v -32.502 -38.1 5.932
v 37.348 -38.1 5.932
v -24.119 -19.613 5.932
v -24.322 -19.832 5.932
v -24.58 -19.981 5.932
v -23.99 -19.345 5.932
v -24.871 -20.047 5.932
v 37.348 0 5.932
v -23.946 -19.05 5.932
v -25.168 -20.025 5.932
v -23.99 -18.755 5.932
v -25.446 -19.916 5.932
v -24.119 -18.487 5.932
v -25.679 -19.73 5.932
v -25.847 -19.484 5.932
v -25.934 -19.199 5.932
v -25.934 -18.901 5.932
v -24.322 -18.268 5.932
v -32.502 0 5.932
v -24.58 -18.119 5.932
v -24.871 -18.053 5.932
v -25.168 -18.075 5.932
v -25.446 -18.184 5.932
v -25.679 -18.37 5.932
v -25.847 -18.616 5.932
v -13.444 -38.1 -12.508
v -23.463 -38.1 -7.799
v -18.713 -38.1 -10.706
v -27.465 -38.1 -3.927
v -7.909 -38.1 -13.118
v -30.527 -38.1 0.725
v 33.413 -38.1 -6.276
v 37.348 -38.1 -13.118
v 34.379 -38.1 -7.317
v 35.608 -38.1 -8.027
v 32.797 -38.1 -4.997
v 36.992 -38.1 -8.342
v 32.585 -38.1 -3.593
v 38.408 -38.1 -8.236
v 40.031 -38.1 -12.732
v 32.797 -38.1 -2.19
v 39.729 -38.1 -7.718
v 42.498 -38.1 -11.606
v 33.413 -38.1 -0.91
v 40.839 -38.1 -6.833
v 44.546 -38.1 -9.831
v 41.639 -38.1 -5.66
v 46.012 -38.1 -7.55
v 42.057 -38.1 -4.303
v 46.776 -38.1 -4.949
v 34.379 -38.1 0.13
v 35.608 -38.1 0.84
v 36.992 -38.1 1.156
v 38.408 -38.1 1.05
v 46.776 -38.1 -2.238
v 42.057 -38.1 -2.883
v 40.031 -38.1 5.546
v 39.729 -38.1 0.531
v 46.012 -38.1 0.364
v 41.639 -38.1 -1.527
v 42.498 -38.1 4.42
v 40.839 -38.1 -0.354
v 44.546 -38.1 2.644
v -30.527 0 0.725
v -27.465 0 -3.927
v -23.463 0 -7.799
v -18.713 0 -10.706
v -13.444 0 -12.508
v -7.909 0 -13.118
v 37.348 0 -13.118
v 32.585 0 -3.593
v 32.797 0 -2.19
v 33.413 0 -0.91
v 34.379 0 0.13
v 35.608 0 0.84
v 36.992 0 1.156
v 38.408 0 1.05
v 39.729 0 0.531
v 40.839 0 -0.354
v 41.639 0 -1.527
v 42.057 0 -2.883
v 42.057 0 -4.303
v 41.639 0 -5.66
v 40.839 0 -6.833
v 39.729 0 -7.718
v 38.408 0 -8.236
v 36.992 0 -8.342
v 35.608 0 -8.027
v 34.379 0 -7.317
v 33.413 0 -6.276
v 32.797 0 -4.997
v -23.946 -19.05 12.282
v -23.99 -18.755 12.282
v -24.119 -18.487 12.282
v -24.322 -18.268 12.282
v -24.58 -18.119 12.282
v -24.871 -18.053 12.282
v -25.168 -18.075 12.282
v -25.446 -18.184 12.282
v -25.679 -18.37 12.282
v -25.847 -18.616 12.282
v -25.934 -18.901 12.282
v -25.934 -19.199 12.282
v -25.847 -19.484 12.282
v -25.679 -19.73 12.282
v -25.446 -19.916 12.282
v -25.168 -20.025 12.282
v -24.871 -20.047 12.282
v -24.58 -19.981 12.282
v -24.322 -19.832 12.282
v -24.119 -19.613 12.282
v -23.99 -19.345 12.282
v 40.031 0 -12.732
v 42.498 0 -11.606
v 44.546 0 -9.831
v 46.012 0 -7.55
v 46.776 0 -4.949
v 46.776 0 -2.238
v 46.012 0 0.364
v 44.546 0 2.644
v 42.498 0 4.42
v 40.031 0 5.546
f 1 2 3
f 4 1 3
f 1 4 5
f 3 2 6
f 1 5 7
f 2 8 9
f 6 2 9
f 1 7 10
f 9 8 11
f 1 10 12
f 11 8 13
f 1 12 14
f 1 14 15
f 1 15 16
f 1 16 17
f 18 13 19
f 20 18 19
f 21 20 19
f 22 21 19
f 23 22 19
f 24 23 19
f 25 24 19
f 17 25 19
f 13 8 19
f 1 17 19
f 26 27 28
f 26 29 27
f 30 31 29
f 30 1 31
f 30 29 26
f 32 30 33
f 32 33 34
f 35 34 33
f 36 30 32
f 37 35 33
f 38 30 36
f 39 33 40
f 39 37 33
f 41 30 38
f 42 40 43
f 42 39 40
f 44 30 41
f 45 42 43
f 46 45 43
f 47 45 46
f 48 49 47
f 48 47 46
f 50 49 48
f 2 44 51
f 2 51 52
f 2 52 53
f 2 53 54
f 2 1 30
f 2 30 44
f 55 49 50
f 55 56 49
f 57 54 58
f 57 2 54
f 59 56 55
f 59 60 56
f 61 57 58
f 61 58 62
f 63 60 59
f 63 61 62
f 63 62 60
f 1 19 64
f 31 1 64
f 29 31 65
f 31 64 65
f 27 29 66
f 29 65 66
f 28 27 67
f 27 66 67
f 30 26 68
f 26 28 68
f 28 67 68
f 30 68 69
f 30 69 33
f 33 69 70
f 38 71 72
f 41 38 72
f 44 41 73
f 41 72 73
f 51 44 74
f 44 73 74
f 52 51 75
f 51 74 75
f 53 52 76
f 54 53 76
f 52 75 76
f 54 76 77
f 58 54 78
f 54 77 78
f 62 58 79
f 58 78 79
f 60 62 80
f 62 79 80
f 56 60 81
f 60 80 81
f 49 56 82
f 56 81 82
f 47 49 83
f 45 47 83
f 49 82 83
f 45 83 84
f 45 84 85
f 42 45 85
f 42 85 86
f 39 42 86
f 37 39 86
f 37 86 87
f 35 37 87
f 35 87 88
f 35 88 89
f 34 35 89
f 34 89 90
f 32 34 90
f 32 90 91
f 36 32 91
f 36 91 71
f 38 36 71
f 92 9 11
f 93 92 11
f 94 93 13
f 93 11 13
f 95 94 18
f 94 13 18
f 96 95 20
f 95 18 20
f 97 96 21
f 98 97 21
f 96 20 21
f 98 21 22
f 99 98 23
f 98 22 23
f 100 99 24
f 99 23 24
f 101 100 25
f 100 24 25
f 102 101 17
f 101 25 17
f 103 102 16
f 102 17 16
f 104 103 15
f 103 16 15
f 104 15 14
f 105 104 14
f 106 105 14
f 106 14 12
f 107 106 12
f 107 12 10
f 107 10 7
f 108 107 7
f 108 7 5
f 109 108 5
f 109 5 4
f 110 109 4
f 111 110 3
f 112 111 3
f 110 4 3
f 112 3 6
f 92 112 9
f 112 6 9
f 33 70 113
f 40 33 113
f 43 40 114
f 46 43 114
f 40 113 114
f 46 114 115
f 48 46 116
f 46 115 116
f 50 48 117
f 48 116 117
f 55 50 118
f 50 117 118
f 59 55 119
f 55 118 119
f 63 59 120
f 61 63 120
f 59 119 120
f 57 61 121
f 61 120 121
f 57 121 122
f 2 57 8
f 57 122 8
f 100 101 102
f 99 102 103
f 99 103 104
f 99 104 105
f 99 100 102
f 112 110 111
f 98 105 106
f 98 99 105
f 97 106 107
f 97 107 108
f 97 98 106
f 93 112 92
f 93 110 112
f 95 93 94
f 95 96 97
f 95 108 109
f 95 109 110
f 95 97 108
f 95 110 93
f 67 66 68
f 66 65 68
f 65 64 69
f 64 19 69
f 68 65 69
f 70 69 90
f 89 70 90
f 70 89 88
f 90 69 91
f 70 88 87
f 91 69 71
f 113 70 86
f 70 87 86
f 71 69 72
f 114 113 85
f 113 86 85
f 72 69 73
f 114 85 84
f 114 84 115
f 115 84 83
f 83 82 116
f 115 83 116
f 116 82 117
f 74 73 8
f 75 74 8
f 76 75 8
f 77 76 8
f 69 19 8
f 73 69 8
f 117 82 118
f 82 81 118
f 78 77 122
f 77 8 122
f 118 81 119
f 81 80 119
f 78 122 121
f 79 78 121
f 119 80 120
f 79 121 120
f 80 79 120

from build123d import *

# Parameters (mm, degrees)
F1_DEPTH    = 38.1
F2_T1_DEPTH = 161.0672212421
F4_D        = 9.525
F5_R        = 1
F6_DEPTH    = 6.35


# Not quite as in the source:
# - a fillet or chamfer that OpenCascade refuses, or shapes differently, is made with other operations: its cross-section is extruded or revolved along the edge and cut away or added


with BuildPart() as f1:
    # F0 (on Front) → F1 (new body)
    with BuildSketch(Plane.XZ):
        with BuildLine():
            Line((37.3479522824, 5.9316984817), (-32.5020477176, 5.9316984817))
            Line((-32.5020477176, 5.9316984817), (-32.5020477176, -13.1183015183))
            Line((-32.5020477176, -13.1183015183), (37.3479522824, -13.1183015183))
            ThreePointArc((37.3479522824, -13.1183015183), (46.8729522824, -3.5933015183), (37.3479522824, 5.9316984817))
        make_face()
    extrude(amount=F1_DEPTH)

    # F2: fillet of radius 25.4 on 1 edges, made by hand

    # F2_s2 → F2_t1 (cut)
    with BuildSketch(Plane.XZ.offset(-61.483610621)):
        with BuildLine():
            ThreePointArc((-32.5020477176, 5.9316984817), (-23.4628633358, -7.7987646603), (-7.9086034692, -13.1183015183))
            Line((-7.9086034692, -13.1183015183), (-32.5020477176, -13.1183015183))
            Line((-32.5020477176, -13.1183015183), (-32.5020477176, 5.9316984817))
        make_face()
    extrude(amount=F2_T1_DEPTH, mode=Mode.SUBTRACT)

    # F4 (through all)
    with Locations(Plane.XZ.offset(38.1)):
        with Locations((37.3479522824, -3.5933015183)):
            Hole(F4_D / 2)

    # F5 (on face) → F6 (join)
    with BuildSketch(Plane.XY.offset(5.9316984817)):
        with Locations((-24.94562231, -19.05)):
            Circle(F5_R)
    extrude(amount=F6_DEPTH)


solid = f1.part
